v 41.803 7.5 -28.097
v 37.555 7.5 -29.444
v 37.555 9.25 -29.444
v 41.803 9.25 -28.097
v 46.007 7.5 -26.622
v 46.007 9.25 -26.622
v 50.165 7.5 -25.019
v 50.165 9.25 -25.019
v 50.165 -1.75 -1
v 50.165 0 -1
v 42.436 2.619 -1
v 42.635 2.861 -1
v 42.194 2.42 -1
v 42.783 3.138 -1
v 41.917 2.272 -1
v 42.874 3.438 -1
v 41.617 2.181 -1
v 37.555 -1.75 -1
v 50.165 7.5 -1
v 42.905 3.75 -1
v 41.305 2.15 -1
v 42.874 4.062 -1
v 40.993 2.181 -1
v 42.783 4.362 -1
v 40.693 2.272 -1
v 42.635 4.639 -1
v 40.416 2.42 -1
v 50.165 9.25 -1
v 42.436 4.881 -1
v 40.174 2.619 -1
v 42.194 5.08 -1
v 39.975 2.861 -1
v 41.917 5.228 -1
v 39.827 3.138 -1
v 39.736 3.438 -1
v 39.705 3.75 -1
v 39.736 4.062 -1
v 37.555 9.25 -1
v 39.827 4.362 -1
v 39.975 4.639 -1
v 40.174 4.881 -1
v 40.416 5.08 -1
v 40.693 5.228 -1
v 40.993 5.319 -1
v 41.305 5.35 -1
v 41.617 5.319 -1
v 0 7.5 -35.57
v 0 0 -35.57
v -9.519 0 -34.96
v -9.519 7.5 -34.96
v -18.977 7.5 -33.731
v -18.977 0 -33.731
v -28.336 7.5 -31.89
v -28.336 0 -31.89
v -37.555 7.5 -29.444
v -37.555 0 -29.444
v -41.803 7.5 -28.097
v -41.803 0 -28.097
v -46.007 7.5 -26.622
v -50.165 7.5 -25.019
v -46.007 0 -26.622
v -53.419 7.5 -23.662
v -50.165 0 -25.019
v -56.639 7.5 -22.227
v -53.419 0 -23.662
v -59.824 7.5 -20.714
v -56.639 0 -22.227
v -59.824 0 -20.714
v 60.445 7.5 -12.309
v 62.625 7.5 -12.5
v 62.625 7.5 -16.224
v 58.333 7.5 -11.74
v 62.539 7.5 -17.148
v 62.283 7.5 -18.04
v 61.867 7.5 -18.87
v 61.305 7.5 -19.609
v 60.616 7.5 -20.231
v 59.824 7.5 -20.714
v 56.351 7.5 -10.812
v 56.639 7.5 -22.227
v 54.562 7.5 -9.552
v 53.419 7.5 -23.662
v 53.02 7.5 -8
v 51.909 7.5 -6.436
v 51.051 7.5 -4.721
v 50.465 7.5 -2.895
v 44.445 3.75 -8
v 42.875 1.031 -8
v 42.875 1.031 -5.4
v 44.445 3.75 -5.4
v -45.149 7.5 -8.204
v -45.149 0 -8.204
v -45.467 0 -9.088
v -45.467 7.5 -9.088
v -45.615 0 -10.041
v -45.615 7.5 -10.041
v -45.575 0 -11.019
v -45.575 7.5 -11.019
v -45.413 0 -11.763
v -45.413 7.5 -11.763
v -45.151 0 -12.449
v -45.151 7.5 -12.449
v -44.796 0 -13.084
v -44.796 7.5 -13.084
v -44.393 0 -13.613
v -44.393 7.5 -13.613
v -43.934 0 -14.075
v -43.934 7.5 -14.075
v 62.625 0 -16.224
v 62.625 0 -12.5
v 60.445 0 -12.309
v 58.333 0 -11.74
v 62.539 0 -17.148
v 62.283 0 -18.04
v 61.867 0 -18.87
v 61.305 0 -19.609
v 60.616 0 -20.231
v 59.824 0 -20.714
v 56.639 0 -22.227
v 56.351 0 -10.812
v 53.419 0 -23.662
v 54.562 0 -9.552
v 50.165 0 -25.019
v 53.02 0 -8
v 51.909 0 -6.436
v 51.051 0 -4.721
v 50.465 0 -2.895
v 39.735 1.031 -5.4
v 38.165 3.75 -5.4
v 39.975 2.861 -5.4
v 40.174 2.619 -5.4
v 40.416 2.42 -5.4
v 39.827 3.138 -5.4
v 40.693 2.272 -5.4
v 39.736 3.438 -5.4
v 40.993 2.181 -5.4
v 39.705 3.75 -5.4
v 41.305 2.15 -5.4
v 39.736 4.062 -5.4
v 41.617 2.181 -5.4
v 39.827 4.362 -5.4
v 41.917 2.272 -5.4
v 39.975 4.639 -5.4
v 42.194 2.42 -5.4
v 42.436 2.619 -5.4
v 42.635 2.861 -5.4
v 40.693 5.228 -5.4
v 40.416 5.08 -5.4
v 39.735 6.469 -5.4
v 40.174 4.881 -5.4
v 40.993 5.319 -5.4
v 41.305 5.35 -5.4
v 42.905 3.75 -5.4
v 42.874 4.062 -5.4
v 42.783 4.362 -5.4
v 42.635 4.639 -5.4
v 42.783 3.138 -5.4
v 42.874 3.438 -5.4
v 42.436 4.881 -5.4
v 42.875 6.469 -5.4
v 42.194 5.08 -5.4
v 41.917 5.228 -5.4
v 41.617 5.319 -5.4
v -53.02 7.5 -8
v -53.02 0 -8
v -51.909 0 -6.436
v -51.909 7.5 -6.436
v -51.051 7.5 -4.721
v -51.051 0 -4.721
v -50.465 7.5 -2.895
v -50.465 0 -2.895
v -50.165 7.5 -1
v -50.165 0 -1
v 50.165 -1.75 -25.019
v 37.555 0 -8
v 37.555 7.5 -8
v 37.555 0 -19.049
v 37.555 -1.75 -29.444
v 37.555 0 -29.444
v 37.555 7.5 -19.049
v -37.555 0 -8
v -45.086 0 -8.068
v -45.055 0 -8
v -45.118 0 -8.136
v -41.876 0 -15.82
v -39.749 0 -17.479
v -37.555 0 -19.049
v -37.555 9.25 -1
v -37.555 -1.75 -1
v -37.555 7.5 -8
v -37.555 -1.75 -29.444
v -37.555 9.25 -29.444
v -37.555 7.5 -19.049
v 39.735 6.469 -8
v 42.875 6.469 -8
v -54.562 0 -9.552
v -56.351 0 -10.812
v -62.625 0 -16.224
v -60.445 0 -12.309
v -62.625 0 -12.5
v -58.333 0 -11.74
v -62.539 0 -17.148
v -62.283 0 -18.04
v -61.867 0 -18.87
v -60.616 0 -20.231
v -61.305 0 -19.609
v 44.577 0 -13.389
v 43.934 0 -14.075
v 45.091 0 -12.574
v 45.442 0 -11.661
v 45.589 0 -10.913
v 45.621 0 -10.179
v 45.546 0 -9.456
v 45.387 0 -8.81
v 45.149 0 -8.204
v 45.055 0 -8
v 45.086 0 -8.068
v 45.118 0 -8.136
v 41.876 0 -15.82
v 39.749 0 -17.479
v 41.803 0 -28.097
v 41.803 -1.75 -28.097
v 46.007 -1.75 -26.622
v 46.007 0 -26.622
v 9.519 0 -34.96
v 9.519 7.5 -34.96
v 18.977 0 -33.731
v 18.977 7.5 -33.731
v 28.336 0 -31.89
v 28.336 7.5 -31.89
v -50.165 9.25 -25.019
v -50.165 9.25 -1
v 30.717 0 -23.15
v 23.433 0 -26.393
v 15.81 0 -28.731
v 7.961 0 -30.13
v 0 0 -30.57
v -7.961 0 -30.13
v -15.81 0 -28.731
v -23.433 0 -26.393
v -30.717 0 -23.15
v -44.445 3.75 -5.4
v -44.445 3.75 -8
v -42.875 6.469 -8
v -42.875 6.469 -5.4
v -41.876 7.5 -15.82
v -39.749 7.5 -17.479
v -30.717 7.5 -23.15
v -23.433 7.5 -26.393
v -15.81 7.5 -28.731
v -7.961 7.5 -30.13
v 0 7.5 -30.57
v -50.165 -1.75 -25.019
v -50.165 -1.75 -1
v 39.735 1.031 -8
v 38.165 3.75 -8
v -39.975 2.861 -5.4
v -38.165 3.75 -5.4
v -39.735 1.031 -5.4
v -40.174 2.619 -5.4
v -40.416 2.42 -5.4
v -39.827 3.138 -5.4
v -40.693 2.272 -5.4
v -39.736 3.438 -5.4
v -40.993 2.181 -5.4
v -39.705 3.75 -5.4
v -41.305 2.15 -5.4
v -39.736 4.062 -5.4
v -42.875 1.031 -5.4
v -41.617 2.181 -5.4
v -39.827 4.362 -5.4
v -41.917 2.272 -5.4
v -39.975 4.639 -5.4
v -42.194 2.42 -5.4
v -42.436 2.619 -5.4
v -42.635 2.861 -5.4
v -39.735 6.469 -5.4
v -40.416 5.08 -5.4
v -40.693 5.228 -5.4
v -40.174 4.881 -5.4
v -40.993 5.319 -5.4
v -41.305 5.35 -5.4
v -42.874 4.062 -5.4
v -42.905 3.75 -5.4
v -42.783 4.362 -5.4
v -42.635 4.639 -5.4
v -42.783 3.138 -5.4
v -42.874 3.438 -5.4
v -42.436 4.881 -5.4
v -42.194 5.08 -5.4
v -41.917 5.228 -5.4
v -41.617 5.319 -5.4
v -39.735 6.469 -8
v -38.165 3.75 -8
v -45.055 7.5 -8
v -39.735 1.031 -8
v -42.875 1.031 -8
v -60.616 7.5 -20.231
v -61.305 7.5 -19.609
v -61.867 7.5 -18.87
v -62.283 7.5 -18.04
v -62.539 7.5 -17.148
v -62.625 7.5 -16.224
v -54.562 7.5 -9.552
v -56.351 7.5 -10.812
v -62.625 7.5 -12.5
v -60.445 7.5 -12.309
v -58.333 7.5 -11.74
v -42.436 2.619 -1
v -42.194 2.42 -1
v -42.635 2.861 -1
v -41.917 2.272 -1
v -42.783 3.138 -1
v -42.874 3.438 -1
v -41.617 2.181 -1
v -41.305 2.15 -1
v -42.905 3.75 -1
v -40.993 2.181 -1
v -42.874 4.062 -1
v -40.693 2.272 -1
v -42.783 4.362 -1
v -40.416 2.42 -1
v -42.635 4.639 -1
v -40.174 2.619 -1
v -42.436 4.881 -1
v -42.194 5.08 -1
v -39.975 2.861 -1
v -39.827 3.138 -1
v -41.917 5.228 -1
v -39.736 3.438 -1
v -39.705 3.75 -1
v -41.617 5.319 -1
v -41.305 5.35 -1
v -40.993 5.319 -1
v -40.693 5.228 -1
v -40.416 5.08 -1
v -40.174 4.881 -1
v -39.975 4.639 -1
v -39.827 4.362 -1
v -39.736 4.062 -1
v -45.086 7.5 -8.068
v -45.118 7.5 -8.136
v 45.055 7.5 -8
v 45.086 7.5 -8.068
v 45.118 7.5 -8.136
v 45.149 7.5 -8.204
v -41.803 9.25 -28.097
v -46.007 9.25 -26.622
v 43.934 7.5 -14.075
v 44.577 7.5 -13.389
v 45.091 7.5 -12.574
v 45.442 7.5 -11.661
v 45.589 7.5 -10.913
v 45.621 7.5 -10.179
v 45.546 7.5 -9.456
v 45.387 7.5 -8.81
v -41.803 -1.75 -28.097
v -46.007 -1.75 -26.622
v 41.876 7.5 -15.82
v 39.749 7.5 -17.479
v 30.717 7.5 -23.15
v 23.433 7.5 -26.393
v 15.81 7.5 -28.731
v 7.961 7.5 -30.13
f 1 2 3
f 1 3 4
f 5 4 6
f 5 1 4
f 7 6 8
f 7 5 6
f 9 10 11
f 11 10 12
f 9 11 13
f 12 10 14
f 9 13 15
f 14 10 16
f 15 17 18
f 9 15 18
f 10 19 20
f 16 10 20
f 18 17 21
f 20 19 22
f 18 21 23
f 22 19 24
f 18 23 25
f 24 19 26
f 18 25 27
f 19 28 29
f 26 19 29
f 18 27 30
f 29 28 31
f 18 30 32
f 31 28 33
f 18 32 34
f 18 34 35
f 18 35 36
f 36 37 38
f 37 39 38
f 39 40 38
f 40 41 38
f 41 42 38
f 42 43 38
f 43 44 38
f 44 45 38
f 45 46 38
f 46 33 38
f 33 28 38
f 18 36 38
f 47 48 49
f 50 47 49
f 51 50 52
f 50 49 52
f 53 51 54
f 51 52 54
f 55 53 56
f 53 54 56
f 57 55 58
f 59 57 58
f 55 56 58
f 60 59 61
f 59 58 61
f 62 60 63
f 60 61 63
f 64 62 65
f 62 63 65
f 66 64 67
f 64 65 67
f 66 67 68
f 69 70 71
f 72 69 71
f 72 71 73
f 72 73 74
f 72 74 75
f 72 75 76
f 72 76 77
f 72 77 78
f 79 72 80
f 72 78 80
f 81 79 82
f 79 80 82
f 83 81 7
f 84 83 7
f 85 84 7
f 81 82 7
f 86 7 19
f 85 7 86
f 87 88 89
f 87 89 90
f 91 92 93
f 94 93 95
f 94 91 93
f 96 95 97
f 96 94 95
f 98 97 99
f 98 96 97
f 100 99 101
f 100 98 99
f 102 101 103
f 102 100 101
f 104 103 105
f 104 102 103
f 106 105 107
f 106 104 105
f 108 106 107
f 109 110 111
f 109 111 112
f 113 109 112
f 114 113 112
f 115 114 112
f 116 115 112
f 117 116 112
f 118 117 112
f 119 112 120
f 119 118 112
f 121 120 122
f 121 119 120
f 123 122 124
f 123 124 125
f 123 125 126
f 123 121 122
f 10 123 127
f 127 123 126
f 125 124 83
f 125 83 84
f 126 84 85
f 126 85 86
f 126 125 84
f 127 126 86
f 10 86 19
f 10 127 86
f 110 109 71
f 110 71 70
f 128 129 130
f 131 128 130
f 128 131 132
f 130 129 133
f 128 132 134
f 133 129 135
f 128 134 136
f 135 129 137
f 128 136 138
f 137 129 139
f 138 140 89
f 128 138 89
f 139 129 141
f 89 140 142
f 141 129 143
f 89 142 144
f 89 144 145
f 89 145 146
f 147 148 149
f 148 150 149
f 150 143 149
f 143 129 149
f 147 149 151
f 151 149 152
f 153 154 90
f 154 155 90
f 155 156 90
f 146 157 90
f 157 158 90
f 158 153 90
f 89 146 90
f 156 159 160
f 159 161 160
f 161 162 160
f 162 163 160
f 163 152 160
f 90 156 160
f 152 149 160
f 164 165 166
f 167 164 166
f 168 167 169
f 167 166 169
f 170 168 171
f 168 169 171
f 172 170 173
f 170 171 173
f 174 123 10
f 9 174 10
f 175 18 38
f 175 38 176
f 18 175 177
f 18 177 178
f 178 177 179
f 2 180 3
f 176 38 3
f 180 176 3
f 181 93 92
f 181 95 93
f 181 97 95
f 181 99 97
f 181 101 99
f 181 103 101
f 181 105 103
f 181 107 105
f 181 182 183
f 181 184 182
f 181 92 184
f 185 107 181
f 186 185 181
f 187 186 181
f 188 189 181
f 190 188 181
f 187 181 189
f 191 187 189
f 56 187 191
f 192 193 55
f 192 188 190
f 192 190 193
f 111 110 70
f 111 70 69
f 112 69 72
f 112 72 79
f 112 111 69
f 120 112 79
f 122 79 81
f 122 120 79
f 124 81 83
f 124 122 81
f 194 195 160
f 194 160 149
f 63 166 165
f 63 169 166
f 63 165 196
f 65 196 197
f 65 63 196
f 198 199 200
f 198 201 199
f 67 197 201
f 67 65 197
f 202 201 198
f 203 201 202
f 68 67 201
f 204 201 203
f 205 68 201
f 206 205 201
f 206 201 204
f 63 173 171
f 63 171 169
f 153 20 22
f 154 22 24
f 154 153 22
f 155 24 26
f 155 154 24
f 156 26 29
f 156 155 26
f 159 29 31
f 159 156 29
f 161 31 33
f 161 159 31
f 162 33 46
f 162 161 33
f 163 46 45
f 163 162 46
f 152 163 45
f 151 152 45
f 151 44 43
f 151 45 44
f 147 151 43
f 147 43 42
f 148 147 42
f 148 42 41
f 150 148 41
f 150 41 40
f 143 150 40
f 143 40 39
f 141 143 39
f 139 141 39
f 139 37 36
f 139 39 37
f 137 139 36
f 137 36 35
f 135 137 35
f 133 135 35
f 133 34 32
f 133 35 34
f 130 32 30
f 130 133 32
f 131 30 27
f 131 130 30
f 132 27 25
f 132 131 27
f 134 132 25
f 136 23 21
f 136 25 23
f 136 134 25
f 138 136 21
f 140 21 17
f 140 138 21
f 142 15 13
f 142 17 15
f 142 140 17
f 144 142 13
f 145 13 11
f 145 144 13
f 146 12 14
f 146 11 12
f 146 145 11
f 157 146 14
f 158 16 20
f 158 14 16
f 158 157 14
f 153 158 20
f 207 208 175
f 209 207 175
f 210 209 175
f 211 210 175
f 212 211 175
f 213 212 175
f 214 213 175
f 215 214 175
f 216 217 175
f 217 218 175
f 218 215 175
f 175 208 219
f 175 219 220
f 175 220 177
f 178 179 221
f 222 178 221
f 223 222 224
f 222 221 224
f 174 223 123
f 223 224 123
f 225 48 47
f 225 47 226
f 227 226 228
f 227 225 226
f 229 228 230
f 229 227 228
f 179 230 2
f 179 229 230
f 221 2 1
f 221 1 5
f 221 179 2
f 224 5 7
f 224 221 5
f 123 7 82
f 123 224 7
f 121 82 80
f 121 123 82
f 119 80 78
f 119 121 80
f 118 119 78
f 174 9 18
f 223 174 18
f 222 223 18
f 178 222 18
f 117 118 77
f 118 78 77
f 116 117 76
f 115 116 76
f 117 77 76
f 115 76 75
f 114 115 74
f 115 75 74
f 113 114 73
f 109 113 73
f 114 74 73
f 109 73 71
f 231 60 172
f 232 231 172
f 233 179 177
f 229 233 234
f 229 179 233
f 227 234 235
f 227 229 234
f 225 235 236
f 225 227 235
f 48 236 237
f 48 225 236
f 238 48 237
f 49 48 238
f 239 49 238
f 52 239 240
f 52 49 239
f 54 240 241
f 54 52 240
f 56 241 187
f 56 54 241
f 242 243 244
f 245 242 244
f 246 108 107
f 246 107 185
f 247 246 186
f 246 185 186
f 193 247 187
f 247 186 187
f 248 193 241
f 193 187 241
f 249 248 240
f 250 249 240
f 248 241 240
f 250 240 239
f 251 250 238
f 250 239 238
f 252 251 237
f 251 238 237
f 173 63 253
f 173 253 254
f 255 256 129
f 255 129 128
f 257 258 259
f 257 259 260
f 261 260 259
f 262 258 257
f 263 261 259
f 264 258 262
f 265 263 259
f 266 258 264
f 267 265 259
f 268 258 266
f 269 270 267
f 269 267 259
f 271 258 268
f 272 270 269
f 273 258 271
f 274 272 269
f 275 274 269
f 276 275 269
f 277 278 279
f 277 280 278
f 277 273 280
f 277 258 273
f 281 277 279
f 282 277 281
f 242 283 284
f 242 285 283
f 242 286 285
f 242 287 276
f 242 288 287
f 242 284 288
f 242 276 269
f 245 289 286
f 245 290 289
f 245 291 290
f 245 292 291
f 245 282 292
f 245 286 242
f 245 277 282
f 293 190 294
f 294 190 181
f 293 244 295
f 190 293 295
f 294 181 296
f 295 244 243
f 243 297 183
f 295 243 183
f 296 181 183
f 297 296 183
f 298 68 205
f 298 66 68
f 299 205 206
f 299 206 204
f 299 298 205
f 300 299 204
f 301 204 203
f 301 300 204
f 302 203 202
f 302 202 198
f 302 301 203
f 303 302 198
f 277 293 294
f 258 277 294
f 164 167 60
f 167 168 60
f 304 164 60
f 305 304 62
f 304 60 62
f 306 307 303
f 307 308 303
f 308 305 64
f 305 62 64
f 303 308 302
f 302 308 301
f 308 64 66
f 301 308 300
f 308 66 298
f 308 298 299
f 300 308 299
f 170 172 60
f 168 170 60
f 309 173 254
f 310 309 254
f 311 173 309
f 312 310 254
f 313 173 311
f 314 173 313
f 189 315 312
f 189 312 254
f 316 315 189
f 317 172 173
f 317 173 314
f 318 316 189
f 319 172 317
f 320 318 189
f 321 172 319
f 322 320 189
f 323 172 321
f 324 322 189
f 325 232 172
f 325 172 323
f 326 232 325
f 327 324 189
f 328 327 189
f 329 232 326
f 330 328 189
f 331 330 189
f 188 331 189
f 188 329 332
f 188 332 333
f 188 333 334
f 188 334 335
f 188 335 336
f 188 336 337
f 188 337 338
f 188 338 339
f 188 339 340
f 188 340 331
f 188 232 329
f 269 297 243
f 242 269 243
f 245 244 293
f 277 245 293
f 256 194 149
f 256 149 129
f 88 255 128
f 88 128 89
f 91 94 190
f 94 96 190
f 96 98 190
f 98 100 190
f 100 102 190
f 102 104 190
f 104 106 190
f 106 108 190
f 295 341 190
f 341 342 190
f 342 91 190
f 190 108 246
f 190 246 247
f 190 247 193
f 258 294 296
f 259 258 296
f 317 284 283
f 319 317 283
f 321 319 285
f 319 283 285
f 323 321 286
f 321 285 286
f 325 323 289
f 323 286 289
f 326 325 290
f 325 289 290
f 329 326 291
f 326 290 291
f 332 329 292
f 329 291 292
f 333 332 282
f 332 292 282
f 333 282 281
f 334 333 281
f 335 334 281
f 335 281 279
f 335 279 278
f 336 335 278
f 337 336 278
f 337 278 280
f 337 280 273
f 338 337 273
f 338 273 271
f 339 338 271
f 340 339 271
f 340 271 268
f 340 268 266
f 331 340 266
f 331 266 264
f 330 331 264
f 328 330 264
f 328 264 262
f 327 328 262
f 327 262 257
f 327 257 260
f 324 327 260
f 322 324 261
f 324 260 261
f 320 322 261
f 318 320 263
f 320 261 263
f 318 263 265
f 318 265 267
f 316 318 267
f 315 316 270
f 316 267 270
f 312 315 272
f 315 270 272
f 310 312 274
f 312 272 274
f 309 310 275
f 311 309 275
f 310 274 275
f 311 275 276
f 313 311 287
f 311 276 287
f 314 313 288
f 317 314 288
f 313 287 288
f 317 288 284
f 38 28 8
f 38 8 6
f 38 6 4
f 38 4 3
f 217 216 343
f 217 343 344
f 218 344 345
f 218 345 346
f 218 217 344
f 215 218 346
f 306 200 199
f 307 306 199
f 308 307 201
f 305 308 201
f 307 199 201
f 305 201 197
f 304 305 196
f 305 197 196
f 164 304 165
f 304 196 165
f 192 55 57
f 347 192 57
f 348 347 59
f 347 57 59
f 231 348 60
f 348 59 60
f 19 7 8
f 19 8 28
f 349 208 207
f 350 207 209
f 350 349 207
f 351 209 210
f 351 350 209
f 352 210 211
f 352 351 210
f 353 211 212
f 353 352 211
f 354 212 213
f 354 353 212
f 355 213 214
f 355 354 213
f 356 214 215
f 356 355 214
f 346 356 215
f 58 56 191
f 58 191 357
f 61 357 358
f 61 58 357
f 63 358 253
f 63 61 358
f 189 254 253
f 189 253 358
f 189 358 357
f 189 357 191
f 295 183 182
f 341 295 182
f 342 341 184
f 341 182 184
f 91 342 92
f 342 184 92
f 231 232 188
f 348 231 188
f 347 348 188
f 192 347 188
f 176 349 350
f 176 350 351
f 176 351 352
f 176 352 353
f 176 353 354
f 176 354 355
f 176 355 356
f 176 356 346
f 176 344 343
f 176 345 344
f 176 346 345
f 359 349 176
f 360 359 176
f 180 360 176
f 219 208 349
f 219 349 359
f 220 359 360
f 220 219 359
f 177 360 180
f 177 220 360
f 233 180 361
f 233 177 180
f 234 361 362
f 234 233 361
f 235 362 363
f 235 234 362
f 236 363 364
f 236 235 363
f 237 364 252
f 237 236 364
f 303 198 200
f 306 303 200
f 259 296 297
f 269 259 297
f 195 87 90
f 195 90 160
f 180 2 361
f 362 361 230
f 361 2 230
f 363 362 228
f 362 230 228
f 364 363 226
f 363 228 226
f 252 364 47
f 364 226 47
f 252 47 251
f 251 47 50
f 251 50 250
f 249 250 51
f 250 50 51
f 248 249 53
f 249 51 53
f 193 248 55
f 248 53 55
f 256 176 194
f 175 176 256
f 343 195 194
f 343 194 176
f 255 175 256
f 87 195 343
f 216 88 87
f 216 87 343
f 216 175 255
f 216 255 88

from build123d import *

# Parameters (mm, degrees)
BOSS_EXTRUDE1_DEPTH  = 7.5
SKETCH2_R            = 1.6
CUT_EXTRUDE1_DEPTH   = 65.077737633
BOSS_EXTRUDE4_START  = -7.5
BOSS_EXTRUDE4_DEPTH  = 7.5
SKETCH4_R            = 1.6
CUT_EXTRUDE2_DEPTH   = 2.6
SKETCH6_R            = 156.176390482
CUT_EXTRUDE3_DEPTH   = 1
FILLET1_R            = 5
FILLET2_R            = 5
FILLET3_R            = 5
FILLET4_R            = 5
BOSS_EXTRUDE5_DEPTH  = 1.75
MIRROR9_COPY_1_DEPTH = 1.75


with BuildPart() as part:
    # Sketch1 → Boss-Extrude1 (new body)
    with BuildSketch(Plane(origin=(0, 0, 0), x_dir=(1, 0, 0), z_dir=(0, 1, 0))):
        with BuildLine():
            ThreePointArc((-53.020313644, 8), (-50.871094703, 4.253905297), (-50.125, 0))
            ThreePointArc((-50.125, 0), (-49.964111284, 4.012880342), (-49.482477959, 8))
            Line((-49.482477959, 8), (-53.020313644, 8))
        make_face()
        with BuildLine():
            ThreePointArc((-49.482477959, 8), (-49.964111284, 4.012880342), (-50.125, 0))
            Line((-50.125, 0), (-43.319433445, 0))
            ThreePointArc((-43.319433445, 0), (-43.758313694, 4.093048719), (-45.055, 8))
            Line((-45.055, 8), (-49.482477959, 8))
        make_face()
        with BuildLine():
            ThreePointArc((-45.055, 8), (-43.758313694, 4.093048719), (-43.319433445, 0))
            Line((-43.319433445, 0), (-37.555, 0))
            Line((-37.555, 0), (-37.555, 8))
            Line((-37.555, 8), (-45.055, 8))
        make_face()
        with BuildLine():
            ThreePointArc((-48.396817166, 13.048513832), (-49.004703616, 10.538246936), (-49.482477959, 8))
            Line((-49.482477959, 8), (-45.055, 8))
            ThreePointArc((-45.055, 8), (-46.526770878, 10.656074283), (-48.396817166, 13.048513832))
        make_face()
        with BuildLine():
            ThreePointArc((-62.625, 12.5), (-57.321699141, 11.319231423), (-53.020313644, 8))
            Line((-53.020313644, 8), (-49.482477959, 8))
            ThreePointArc((-49.482477959, 8), (-49.004703616, 10.538246936), (-48.396817166, 13.048513832))
            ThreePointArc((-48.396817166, 13.048513832), (-54.853386661, 17.672207732), (-62.625, 19.305566555))
            Line((-62.625, 19.305566555), (-62.625, 12.5))
        make_face()
    boss_extrude1 = extrude(amount=BOSS_EXTRUDE1_DEPTH)

    # Sketch2 → Cut-Extrude1 (cut, through all)
    with BuildSketch(Plane(origin=(0, 0, -8), x_dir=(-1, 0, 0), z_dir=(0, 0, -1))):
        with Locations((41.305, 3.75)):
            Circle(SKETCH2_R)
    cut_extrude1 = extrude(amount=-CUT_EXTRUDE1_DEPTH, mode=Mode.SUBTRACT)

    # Sketch3 → Boss-Extrude4 (add)
    with BuildSketch(Plane(origin=(0, 7.5, 0), x_dir=(1, 0, 0), z_dir=(0, 1, 0)).offset(BOSS_EXTRUDE4_START)):
        with BuildLine():
            ThreePointArc((-62.625, 19.305566555), (-53.806914146, 17.173999589), (-46.936073969, 11.25))
            ThreePointArc((-46.936073969, 11.25), (-25.405775196, 25.617547828), (0, 30.57))
            Line((0, 30.57), (0, 35.57))
            ThreePointArc((0, 35.57), (-32.221430215, 30.937551956), (-62.625, 19.305566555))
        make_face()
    boss_extrude4 = extrude(amount=BOSS_EXTRUDE4_DEPTH)

    # Sketch4 → Cut-Extrude2 (cut)
    with BuildSketch(Plane(origin=(0, 0, -8), x_dir=(-1, 0, 0), z_dir=(0, 0, -1))):
        Polygon((39.735, 1.030680232), (42.875, 1.030680232), (44.445, 3.75), (42.875, 6.469319768), (39.735, 6.469319768), (38.165, 3.75), align=None)
        with Locations((41.305, 3.75)):
            Circle(SKETCH4_R, mode=Mode.SUBTRACT)
    cut_extrude2 = extrude(amount=-CUT_EXTRUDE2_DEPTH, mode=Mode.SUBTRACT)

    # Mirror5: Boss-Extrude4 across plane
    add(boss_extrude4.mirror(Plane(origin=(0, 0, 0), x_dir=(0, 0, 1), z_dir=(1, 0, 0))))

    # Mirror6: Boss-Extrude1 across plane
    add(boss_extrude1.mirror(Plane(origin=(0, 0, 0), x_dir=(0, 0, 1), z_dir=(1, 0, 0))))

    # Mirror7: Cut-Extrude1, Cut-Extrude2 across plane
    add(cut_extrude1.mirror(Plane(origin=(0, 0, 0), x_dir=(0, 0, 1), z_dir=(1, 0, 0))), mode=Mode.SUBTRACT)
    add(cut_extrude2.mirror(Plane(origin=(0, 0, 0), x_dir=(0, 0, 1), z_dir=(1, 0, 0))), mode=Mode.SUBTRACT)

    # Sketch6 → Cut-Extrude3 (cut)
    with BuildSketch(Plane.XY):
        Circle(SKETCH6_R)
    extrude(amount=-CUT_EXTRUDE3_DEPTH, mode=Mode.SUBTRACT)

    # Fillet1
    fillet1_edges = [part.edges().sort_by_distance(p)[0] for p in [
        (-62.625, 3.75, -19.305566555),
    ]]
    fillet(fillet1_edges, radius=FILLET1_R)

    # Fillet2
    fillet2_edges = [part.edges().sort_by_distance(p)[0] for p in [
        (62.625, 3.75, -19.305566555),
    ]]
    fillet(fillet2_edges, radius=FILLET2_R)

    # Fillet3
    fillet3_edges = [part.edges().sort_by_distance(p)[0] for p in [
        (-46.936073969, 3.75, -11.25),
    ]]
    fillet(fillet3_edges, radius=FILLET3_R)

    # Fillet4
    fillet4_edges = [part.edges().sort_by_distance(p)[0] for p in [
        (46.936073969, 3.75, -11.25),
    ]]
    fillet(fillet4_edges, radius=FILLET4_R)

    # Sketch7 → Boss-Extrude5 (add)
    with BuildSketch(Plane(origin=(0, 7.5, 0), x_dir=(1, 0, 0), z_dir=(0, 1, 0))):
        with BuildLine():
            Line((-50.165064206, 1), (-37.555, 1))
            Line((-37.555, 1), (-37.555, 29.44421276))
            ThreePointArc((-37.555, 29.44421276), (-43.910509627, 27.37533218), (-50.165064206, 25.0187846))
            Line((-50.165064206, 25.0187846), (-50.165064206, 1))
        make_face()
    boss_extrude5 = extrude(amount=BOSS_EXTRUDE5_DEPTH)

    # Mirror8: Boss-Extrude5 across plane
    add(boss_extrude5.mirror(Plane.ZX.offset(3.75)))

    # Mirror9: Boss-Extrude5 across plane
    add(boss_extrude5.mirror(Plane(origin=(0, 0, 0), x_dir=(0, 0, 1), z_dir=(1, 0, 0))))

    # Mirror9 copy 1 sketch → Mirror9 copy 1 (add)
    with BuildSketch(Plane(origin=(0, 0, 0), x_dir=(-1, 0, 0), z_dir=(0, -1, 0))):
        with BuildLine():
            Line((-50.165064206, 1), (-37.555, 1))
            Line((-37.555, 1), (-37.555, 29.44421276))
            ThreePointArc((-37.555, 29.44421276), (-43.910509627, 27.37533218), (-50.165064206, 25.0187846))
            Line((-50.165064206, 25.0187846), (-50.165064206, 1))
        make_face()
    extrude(amount=MIRROR9_COPY_1_DEPTH)


solid = part.part
